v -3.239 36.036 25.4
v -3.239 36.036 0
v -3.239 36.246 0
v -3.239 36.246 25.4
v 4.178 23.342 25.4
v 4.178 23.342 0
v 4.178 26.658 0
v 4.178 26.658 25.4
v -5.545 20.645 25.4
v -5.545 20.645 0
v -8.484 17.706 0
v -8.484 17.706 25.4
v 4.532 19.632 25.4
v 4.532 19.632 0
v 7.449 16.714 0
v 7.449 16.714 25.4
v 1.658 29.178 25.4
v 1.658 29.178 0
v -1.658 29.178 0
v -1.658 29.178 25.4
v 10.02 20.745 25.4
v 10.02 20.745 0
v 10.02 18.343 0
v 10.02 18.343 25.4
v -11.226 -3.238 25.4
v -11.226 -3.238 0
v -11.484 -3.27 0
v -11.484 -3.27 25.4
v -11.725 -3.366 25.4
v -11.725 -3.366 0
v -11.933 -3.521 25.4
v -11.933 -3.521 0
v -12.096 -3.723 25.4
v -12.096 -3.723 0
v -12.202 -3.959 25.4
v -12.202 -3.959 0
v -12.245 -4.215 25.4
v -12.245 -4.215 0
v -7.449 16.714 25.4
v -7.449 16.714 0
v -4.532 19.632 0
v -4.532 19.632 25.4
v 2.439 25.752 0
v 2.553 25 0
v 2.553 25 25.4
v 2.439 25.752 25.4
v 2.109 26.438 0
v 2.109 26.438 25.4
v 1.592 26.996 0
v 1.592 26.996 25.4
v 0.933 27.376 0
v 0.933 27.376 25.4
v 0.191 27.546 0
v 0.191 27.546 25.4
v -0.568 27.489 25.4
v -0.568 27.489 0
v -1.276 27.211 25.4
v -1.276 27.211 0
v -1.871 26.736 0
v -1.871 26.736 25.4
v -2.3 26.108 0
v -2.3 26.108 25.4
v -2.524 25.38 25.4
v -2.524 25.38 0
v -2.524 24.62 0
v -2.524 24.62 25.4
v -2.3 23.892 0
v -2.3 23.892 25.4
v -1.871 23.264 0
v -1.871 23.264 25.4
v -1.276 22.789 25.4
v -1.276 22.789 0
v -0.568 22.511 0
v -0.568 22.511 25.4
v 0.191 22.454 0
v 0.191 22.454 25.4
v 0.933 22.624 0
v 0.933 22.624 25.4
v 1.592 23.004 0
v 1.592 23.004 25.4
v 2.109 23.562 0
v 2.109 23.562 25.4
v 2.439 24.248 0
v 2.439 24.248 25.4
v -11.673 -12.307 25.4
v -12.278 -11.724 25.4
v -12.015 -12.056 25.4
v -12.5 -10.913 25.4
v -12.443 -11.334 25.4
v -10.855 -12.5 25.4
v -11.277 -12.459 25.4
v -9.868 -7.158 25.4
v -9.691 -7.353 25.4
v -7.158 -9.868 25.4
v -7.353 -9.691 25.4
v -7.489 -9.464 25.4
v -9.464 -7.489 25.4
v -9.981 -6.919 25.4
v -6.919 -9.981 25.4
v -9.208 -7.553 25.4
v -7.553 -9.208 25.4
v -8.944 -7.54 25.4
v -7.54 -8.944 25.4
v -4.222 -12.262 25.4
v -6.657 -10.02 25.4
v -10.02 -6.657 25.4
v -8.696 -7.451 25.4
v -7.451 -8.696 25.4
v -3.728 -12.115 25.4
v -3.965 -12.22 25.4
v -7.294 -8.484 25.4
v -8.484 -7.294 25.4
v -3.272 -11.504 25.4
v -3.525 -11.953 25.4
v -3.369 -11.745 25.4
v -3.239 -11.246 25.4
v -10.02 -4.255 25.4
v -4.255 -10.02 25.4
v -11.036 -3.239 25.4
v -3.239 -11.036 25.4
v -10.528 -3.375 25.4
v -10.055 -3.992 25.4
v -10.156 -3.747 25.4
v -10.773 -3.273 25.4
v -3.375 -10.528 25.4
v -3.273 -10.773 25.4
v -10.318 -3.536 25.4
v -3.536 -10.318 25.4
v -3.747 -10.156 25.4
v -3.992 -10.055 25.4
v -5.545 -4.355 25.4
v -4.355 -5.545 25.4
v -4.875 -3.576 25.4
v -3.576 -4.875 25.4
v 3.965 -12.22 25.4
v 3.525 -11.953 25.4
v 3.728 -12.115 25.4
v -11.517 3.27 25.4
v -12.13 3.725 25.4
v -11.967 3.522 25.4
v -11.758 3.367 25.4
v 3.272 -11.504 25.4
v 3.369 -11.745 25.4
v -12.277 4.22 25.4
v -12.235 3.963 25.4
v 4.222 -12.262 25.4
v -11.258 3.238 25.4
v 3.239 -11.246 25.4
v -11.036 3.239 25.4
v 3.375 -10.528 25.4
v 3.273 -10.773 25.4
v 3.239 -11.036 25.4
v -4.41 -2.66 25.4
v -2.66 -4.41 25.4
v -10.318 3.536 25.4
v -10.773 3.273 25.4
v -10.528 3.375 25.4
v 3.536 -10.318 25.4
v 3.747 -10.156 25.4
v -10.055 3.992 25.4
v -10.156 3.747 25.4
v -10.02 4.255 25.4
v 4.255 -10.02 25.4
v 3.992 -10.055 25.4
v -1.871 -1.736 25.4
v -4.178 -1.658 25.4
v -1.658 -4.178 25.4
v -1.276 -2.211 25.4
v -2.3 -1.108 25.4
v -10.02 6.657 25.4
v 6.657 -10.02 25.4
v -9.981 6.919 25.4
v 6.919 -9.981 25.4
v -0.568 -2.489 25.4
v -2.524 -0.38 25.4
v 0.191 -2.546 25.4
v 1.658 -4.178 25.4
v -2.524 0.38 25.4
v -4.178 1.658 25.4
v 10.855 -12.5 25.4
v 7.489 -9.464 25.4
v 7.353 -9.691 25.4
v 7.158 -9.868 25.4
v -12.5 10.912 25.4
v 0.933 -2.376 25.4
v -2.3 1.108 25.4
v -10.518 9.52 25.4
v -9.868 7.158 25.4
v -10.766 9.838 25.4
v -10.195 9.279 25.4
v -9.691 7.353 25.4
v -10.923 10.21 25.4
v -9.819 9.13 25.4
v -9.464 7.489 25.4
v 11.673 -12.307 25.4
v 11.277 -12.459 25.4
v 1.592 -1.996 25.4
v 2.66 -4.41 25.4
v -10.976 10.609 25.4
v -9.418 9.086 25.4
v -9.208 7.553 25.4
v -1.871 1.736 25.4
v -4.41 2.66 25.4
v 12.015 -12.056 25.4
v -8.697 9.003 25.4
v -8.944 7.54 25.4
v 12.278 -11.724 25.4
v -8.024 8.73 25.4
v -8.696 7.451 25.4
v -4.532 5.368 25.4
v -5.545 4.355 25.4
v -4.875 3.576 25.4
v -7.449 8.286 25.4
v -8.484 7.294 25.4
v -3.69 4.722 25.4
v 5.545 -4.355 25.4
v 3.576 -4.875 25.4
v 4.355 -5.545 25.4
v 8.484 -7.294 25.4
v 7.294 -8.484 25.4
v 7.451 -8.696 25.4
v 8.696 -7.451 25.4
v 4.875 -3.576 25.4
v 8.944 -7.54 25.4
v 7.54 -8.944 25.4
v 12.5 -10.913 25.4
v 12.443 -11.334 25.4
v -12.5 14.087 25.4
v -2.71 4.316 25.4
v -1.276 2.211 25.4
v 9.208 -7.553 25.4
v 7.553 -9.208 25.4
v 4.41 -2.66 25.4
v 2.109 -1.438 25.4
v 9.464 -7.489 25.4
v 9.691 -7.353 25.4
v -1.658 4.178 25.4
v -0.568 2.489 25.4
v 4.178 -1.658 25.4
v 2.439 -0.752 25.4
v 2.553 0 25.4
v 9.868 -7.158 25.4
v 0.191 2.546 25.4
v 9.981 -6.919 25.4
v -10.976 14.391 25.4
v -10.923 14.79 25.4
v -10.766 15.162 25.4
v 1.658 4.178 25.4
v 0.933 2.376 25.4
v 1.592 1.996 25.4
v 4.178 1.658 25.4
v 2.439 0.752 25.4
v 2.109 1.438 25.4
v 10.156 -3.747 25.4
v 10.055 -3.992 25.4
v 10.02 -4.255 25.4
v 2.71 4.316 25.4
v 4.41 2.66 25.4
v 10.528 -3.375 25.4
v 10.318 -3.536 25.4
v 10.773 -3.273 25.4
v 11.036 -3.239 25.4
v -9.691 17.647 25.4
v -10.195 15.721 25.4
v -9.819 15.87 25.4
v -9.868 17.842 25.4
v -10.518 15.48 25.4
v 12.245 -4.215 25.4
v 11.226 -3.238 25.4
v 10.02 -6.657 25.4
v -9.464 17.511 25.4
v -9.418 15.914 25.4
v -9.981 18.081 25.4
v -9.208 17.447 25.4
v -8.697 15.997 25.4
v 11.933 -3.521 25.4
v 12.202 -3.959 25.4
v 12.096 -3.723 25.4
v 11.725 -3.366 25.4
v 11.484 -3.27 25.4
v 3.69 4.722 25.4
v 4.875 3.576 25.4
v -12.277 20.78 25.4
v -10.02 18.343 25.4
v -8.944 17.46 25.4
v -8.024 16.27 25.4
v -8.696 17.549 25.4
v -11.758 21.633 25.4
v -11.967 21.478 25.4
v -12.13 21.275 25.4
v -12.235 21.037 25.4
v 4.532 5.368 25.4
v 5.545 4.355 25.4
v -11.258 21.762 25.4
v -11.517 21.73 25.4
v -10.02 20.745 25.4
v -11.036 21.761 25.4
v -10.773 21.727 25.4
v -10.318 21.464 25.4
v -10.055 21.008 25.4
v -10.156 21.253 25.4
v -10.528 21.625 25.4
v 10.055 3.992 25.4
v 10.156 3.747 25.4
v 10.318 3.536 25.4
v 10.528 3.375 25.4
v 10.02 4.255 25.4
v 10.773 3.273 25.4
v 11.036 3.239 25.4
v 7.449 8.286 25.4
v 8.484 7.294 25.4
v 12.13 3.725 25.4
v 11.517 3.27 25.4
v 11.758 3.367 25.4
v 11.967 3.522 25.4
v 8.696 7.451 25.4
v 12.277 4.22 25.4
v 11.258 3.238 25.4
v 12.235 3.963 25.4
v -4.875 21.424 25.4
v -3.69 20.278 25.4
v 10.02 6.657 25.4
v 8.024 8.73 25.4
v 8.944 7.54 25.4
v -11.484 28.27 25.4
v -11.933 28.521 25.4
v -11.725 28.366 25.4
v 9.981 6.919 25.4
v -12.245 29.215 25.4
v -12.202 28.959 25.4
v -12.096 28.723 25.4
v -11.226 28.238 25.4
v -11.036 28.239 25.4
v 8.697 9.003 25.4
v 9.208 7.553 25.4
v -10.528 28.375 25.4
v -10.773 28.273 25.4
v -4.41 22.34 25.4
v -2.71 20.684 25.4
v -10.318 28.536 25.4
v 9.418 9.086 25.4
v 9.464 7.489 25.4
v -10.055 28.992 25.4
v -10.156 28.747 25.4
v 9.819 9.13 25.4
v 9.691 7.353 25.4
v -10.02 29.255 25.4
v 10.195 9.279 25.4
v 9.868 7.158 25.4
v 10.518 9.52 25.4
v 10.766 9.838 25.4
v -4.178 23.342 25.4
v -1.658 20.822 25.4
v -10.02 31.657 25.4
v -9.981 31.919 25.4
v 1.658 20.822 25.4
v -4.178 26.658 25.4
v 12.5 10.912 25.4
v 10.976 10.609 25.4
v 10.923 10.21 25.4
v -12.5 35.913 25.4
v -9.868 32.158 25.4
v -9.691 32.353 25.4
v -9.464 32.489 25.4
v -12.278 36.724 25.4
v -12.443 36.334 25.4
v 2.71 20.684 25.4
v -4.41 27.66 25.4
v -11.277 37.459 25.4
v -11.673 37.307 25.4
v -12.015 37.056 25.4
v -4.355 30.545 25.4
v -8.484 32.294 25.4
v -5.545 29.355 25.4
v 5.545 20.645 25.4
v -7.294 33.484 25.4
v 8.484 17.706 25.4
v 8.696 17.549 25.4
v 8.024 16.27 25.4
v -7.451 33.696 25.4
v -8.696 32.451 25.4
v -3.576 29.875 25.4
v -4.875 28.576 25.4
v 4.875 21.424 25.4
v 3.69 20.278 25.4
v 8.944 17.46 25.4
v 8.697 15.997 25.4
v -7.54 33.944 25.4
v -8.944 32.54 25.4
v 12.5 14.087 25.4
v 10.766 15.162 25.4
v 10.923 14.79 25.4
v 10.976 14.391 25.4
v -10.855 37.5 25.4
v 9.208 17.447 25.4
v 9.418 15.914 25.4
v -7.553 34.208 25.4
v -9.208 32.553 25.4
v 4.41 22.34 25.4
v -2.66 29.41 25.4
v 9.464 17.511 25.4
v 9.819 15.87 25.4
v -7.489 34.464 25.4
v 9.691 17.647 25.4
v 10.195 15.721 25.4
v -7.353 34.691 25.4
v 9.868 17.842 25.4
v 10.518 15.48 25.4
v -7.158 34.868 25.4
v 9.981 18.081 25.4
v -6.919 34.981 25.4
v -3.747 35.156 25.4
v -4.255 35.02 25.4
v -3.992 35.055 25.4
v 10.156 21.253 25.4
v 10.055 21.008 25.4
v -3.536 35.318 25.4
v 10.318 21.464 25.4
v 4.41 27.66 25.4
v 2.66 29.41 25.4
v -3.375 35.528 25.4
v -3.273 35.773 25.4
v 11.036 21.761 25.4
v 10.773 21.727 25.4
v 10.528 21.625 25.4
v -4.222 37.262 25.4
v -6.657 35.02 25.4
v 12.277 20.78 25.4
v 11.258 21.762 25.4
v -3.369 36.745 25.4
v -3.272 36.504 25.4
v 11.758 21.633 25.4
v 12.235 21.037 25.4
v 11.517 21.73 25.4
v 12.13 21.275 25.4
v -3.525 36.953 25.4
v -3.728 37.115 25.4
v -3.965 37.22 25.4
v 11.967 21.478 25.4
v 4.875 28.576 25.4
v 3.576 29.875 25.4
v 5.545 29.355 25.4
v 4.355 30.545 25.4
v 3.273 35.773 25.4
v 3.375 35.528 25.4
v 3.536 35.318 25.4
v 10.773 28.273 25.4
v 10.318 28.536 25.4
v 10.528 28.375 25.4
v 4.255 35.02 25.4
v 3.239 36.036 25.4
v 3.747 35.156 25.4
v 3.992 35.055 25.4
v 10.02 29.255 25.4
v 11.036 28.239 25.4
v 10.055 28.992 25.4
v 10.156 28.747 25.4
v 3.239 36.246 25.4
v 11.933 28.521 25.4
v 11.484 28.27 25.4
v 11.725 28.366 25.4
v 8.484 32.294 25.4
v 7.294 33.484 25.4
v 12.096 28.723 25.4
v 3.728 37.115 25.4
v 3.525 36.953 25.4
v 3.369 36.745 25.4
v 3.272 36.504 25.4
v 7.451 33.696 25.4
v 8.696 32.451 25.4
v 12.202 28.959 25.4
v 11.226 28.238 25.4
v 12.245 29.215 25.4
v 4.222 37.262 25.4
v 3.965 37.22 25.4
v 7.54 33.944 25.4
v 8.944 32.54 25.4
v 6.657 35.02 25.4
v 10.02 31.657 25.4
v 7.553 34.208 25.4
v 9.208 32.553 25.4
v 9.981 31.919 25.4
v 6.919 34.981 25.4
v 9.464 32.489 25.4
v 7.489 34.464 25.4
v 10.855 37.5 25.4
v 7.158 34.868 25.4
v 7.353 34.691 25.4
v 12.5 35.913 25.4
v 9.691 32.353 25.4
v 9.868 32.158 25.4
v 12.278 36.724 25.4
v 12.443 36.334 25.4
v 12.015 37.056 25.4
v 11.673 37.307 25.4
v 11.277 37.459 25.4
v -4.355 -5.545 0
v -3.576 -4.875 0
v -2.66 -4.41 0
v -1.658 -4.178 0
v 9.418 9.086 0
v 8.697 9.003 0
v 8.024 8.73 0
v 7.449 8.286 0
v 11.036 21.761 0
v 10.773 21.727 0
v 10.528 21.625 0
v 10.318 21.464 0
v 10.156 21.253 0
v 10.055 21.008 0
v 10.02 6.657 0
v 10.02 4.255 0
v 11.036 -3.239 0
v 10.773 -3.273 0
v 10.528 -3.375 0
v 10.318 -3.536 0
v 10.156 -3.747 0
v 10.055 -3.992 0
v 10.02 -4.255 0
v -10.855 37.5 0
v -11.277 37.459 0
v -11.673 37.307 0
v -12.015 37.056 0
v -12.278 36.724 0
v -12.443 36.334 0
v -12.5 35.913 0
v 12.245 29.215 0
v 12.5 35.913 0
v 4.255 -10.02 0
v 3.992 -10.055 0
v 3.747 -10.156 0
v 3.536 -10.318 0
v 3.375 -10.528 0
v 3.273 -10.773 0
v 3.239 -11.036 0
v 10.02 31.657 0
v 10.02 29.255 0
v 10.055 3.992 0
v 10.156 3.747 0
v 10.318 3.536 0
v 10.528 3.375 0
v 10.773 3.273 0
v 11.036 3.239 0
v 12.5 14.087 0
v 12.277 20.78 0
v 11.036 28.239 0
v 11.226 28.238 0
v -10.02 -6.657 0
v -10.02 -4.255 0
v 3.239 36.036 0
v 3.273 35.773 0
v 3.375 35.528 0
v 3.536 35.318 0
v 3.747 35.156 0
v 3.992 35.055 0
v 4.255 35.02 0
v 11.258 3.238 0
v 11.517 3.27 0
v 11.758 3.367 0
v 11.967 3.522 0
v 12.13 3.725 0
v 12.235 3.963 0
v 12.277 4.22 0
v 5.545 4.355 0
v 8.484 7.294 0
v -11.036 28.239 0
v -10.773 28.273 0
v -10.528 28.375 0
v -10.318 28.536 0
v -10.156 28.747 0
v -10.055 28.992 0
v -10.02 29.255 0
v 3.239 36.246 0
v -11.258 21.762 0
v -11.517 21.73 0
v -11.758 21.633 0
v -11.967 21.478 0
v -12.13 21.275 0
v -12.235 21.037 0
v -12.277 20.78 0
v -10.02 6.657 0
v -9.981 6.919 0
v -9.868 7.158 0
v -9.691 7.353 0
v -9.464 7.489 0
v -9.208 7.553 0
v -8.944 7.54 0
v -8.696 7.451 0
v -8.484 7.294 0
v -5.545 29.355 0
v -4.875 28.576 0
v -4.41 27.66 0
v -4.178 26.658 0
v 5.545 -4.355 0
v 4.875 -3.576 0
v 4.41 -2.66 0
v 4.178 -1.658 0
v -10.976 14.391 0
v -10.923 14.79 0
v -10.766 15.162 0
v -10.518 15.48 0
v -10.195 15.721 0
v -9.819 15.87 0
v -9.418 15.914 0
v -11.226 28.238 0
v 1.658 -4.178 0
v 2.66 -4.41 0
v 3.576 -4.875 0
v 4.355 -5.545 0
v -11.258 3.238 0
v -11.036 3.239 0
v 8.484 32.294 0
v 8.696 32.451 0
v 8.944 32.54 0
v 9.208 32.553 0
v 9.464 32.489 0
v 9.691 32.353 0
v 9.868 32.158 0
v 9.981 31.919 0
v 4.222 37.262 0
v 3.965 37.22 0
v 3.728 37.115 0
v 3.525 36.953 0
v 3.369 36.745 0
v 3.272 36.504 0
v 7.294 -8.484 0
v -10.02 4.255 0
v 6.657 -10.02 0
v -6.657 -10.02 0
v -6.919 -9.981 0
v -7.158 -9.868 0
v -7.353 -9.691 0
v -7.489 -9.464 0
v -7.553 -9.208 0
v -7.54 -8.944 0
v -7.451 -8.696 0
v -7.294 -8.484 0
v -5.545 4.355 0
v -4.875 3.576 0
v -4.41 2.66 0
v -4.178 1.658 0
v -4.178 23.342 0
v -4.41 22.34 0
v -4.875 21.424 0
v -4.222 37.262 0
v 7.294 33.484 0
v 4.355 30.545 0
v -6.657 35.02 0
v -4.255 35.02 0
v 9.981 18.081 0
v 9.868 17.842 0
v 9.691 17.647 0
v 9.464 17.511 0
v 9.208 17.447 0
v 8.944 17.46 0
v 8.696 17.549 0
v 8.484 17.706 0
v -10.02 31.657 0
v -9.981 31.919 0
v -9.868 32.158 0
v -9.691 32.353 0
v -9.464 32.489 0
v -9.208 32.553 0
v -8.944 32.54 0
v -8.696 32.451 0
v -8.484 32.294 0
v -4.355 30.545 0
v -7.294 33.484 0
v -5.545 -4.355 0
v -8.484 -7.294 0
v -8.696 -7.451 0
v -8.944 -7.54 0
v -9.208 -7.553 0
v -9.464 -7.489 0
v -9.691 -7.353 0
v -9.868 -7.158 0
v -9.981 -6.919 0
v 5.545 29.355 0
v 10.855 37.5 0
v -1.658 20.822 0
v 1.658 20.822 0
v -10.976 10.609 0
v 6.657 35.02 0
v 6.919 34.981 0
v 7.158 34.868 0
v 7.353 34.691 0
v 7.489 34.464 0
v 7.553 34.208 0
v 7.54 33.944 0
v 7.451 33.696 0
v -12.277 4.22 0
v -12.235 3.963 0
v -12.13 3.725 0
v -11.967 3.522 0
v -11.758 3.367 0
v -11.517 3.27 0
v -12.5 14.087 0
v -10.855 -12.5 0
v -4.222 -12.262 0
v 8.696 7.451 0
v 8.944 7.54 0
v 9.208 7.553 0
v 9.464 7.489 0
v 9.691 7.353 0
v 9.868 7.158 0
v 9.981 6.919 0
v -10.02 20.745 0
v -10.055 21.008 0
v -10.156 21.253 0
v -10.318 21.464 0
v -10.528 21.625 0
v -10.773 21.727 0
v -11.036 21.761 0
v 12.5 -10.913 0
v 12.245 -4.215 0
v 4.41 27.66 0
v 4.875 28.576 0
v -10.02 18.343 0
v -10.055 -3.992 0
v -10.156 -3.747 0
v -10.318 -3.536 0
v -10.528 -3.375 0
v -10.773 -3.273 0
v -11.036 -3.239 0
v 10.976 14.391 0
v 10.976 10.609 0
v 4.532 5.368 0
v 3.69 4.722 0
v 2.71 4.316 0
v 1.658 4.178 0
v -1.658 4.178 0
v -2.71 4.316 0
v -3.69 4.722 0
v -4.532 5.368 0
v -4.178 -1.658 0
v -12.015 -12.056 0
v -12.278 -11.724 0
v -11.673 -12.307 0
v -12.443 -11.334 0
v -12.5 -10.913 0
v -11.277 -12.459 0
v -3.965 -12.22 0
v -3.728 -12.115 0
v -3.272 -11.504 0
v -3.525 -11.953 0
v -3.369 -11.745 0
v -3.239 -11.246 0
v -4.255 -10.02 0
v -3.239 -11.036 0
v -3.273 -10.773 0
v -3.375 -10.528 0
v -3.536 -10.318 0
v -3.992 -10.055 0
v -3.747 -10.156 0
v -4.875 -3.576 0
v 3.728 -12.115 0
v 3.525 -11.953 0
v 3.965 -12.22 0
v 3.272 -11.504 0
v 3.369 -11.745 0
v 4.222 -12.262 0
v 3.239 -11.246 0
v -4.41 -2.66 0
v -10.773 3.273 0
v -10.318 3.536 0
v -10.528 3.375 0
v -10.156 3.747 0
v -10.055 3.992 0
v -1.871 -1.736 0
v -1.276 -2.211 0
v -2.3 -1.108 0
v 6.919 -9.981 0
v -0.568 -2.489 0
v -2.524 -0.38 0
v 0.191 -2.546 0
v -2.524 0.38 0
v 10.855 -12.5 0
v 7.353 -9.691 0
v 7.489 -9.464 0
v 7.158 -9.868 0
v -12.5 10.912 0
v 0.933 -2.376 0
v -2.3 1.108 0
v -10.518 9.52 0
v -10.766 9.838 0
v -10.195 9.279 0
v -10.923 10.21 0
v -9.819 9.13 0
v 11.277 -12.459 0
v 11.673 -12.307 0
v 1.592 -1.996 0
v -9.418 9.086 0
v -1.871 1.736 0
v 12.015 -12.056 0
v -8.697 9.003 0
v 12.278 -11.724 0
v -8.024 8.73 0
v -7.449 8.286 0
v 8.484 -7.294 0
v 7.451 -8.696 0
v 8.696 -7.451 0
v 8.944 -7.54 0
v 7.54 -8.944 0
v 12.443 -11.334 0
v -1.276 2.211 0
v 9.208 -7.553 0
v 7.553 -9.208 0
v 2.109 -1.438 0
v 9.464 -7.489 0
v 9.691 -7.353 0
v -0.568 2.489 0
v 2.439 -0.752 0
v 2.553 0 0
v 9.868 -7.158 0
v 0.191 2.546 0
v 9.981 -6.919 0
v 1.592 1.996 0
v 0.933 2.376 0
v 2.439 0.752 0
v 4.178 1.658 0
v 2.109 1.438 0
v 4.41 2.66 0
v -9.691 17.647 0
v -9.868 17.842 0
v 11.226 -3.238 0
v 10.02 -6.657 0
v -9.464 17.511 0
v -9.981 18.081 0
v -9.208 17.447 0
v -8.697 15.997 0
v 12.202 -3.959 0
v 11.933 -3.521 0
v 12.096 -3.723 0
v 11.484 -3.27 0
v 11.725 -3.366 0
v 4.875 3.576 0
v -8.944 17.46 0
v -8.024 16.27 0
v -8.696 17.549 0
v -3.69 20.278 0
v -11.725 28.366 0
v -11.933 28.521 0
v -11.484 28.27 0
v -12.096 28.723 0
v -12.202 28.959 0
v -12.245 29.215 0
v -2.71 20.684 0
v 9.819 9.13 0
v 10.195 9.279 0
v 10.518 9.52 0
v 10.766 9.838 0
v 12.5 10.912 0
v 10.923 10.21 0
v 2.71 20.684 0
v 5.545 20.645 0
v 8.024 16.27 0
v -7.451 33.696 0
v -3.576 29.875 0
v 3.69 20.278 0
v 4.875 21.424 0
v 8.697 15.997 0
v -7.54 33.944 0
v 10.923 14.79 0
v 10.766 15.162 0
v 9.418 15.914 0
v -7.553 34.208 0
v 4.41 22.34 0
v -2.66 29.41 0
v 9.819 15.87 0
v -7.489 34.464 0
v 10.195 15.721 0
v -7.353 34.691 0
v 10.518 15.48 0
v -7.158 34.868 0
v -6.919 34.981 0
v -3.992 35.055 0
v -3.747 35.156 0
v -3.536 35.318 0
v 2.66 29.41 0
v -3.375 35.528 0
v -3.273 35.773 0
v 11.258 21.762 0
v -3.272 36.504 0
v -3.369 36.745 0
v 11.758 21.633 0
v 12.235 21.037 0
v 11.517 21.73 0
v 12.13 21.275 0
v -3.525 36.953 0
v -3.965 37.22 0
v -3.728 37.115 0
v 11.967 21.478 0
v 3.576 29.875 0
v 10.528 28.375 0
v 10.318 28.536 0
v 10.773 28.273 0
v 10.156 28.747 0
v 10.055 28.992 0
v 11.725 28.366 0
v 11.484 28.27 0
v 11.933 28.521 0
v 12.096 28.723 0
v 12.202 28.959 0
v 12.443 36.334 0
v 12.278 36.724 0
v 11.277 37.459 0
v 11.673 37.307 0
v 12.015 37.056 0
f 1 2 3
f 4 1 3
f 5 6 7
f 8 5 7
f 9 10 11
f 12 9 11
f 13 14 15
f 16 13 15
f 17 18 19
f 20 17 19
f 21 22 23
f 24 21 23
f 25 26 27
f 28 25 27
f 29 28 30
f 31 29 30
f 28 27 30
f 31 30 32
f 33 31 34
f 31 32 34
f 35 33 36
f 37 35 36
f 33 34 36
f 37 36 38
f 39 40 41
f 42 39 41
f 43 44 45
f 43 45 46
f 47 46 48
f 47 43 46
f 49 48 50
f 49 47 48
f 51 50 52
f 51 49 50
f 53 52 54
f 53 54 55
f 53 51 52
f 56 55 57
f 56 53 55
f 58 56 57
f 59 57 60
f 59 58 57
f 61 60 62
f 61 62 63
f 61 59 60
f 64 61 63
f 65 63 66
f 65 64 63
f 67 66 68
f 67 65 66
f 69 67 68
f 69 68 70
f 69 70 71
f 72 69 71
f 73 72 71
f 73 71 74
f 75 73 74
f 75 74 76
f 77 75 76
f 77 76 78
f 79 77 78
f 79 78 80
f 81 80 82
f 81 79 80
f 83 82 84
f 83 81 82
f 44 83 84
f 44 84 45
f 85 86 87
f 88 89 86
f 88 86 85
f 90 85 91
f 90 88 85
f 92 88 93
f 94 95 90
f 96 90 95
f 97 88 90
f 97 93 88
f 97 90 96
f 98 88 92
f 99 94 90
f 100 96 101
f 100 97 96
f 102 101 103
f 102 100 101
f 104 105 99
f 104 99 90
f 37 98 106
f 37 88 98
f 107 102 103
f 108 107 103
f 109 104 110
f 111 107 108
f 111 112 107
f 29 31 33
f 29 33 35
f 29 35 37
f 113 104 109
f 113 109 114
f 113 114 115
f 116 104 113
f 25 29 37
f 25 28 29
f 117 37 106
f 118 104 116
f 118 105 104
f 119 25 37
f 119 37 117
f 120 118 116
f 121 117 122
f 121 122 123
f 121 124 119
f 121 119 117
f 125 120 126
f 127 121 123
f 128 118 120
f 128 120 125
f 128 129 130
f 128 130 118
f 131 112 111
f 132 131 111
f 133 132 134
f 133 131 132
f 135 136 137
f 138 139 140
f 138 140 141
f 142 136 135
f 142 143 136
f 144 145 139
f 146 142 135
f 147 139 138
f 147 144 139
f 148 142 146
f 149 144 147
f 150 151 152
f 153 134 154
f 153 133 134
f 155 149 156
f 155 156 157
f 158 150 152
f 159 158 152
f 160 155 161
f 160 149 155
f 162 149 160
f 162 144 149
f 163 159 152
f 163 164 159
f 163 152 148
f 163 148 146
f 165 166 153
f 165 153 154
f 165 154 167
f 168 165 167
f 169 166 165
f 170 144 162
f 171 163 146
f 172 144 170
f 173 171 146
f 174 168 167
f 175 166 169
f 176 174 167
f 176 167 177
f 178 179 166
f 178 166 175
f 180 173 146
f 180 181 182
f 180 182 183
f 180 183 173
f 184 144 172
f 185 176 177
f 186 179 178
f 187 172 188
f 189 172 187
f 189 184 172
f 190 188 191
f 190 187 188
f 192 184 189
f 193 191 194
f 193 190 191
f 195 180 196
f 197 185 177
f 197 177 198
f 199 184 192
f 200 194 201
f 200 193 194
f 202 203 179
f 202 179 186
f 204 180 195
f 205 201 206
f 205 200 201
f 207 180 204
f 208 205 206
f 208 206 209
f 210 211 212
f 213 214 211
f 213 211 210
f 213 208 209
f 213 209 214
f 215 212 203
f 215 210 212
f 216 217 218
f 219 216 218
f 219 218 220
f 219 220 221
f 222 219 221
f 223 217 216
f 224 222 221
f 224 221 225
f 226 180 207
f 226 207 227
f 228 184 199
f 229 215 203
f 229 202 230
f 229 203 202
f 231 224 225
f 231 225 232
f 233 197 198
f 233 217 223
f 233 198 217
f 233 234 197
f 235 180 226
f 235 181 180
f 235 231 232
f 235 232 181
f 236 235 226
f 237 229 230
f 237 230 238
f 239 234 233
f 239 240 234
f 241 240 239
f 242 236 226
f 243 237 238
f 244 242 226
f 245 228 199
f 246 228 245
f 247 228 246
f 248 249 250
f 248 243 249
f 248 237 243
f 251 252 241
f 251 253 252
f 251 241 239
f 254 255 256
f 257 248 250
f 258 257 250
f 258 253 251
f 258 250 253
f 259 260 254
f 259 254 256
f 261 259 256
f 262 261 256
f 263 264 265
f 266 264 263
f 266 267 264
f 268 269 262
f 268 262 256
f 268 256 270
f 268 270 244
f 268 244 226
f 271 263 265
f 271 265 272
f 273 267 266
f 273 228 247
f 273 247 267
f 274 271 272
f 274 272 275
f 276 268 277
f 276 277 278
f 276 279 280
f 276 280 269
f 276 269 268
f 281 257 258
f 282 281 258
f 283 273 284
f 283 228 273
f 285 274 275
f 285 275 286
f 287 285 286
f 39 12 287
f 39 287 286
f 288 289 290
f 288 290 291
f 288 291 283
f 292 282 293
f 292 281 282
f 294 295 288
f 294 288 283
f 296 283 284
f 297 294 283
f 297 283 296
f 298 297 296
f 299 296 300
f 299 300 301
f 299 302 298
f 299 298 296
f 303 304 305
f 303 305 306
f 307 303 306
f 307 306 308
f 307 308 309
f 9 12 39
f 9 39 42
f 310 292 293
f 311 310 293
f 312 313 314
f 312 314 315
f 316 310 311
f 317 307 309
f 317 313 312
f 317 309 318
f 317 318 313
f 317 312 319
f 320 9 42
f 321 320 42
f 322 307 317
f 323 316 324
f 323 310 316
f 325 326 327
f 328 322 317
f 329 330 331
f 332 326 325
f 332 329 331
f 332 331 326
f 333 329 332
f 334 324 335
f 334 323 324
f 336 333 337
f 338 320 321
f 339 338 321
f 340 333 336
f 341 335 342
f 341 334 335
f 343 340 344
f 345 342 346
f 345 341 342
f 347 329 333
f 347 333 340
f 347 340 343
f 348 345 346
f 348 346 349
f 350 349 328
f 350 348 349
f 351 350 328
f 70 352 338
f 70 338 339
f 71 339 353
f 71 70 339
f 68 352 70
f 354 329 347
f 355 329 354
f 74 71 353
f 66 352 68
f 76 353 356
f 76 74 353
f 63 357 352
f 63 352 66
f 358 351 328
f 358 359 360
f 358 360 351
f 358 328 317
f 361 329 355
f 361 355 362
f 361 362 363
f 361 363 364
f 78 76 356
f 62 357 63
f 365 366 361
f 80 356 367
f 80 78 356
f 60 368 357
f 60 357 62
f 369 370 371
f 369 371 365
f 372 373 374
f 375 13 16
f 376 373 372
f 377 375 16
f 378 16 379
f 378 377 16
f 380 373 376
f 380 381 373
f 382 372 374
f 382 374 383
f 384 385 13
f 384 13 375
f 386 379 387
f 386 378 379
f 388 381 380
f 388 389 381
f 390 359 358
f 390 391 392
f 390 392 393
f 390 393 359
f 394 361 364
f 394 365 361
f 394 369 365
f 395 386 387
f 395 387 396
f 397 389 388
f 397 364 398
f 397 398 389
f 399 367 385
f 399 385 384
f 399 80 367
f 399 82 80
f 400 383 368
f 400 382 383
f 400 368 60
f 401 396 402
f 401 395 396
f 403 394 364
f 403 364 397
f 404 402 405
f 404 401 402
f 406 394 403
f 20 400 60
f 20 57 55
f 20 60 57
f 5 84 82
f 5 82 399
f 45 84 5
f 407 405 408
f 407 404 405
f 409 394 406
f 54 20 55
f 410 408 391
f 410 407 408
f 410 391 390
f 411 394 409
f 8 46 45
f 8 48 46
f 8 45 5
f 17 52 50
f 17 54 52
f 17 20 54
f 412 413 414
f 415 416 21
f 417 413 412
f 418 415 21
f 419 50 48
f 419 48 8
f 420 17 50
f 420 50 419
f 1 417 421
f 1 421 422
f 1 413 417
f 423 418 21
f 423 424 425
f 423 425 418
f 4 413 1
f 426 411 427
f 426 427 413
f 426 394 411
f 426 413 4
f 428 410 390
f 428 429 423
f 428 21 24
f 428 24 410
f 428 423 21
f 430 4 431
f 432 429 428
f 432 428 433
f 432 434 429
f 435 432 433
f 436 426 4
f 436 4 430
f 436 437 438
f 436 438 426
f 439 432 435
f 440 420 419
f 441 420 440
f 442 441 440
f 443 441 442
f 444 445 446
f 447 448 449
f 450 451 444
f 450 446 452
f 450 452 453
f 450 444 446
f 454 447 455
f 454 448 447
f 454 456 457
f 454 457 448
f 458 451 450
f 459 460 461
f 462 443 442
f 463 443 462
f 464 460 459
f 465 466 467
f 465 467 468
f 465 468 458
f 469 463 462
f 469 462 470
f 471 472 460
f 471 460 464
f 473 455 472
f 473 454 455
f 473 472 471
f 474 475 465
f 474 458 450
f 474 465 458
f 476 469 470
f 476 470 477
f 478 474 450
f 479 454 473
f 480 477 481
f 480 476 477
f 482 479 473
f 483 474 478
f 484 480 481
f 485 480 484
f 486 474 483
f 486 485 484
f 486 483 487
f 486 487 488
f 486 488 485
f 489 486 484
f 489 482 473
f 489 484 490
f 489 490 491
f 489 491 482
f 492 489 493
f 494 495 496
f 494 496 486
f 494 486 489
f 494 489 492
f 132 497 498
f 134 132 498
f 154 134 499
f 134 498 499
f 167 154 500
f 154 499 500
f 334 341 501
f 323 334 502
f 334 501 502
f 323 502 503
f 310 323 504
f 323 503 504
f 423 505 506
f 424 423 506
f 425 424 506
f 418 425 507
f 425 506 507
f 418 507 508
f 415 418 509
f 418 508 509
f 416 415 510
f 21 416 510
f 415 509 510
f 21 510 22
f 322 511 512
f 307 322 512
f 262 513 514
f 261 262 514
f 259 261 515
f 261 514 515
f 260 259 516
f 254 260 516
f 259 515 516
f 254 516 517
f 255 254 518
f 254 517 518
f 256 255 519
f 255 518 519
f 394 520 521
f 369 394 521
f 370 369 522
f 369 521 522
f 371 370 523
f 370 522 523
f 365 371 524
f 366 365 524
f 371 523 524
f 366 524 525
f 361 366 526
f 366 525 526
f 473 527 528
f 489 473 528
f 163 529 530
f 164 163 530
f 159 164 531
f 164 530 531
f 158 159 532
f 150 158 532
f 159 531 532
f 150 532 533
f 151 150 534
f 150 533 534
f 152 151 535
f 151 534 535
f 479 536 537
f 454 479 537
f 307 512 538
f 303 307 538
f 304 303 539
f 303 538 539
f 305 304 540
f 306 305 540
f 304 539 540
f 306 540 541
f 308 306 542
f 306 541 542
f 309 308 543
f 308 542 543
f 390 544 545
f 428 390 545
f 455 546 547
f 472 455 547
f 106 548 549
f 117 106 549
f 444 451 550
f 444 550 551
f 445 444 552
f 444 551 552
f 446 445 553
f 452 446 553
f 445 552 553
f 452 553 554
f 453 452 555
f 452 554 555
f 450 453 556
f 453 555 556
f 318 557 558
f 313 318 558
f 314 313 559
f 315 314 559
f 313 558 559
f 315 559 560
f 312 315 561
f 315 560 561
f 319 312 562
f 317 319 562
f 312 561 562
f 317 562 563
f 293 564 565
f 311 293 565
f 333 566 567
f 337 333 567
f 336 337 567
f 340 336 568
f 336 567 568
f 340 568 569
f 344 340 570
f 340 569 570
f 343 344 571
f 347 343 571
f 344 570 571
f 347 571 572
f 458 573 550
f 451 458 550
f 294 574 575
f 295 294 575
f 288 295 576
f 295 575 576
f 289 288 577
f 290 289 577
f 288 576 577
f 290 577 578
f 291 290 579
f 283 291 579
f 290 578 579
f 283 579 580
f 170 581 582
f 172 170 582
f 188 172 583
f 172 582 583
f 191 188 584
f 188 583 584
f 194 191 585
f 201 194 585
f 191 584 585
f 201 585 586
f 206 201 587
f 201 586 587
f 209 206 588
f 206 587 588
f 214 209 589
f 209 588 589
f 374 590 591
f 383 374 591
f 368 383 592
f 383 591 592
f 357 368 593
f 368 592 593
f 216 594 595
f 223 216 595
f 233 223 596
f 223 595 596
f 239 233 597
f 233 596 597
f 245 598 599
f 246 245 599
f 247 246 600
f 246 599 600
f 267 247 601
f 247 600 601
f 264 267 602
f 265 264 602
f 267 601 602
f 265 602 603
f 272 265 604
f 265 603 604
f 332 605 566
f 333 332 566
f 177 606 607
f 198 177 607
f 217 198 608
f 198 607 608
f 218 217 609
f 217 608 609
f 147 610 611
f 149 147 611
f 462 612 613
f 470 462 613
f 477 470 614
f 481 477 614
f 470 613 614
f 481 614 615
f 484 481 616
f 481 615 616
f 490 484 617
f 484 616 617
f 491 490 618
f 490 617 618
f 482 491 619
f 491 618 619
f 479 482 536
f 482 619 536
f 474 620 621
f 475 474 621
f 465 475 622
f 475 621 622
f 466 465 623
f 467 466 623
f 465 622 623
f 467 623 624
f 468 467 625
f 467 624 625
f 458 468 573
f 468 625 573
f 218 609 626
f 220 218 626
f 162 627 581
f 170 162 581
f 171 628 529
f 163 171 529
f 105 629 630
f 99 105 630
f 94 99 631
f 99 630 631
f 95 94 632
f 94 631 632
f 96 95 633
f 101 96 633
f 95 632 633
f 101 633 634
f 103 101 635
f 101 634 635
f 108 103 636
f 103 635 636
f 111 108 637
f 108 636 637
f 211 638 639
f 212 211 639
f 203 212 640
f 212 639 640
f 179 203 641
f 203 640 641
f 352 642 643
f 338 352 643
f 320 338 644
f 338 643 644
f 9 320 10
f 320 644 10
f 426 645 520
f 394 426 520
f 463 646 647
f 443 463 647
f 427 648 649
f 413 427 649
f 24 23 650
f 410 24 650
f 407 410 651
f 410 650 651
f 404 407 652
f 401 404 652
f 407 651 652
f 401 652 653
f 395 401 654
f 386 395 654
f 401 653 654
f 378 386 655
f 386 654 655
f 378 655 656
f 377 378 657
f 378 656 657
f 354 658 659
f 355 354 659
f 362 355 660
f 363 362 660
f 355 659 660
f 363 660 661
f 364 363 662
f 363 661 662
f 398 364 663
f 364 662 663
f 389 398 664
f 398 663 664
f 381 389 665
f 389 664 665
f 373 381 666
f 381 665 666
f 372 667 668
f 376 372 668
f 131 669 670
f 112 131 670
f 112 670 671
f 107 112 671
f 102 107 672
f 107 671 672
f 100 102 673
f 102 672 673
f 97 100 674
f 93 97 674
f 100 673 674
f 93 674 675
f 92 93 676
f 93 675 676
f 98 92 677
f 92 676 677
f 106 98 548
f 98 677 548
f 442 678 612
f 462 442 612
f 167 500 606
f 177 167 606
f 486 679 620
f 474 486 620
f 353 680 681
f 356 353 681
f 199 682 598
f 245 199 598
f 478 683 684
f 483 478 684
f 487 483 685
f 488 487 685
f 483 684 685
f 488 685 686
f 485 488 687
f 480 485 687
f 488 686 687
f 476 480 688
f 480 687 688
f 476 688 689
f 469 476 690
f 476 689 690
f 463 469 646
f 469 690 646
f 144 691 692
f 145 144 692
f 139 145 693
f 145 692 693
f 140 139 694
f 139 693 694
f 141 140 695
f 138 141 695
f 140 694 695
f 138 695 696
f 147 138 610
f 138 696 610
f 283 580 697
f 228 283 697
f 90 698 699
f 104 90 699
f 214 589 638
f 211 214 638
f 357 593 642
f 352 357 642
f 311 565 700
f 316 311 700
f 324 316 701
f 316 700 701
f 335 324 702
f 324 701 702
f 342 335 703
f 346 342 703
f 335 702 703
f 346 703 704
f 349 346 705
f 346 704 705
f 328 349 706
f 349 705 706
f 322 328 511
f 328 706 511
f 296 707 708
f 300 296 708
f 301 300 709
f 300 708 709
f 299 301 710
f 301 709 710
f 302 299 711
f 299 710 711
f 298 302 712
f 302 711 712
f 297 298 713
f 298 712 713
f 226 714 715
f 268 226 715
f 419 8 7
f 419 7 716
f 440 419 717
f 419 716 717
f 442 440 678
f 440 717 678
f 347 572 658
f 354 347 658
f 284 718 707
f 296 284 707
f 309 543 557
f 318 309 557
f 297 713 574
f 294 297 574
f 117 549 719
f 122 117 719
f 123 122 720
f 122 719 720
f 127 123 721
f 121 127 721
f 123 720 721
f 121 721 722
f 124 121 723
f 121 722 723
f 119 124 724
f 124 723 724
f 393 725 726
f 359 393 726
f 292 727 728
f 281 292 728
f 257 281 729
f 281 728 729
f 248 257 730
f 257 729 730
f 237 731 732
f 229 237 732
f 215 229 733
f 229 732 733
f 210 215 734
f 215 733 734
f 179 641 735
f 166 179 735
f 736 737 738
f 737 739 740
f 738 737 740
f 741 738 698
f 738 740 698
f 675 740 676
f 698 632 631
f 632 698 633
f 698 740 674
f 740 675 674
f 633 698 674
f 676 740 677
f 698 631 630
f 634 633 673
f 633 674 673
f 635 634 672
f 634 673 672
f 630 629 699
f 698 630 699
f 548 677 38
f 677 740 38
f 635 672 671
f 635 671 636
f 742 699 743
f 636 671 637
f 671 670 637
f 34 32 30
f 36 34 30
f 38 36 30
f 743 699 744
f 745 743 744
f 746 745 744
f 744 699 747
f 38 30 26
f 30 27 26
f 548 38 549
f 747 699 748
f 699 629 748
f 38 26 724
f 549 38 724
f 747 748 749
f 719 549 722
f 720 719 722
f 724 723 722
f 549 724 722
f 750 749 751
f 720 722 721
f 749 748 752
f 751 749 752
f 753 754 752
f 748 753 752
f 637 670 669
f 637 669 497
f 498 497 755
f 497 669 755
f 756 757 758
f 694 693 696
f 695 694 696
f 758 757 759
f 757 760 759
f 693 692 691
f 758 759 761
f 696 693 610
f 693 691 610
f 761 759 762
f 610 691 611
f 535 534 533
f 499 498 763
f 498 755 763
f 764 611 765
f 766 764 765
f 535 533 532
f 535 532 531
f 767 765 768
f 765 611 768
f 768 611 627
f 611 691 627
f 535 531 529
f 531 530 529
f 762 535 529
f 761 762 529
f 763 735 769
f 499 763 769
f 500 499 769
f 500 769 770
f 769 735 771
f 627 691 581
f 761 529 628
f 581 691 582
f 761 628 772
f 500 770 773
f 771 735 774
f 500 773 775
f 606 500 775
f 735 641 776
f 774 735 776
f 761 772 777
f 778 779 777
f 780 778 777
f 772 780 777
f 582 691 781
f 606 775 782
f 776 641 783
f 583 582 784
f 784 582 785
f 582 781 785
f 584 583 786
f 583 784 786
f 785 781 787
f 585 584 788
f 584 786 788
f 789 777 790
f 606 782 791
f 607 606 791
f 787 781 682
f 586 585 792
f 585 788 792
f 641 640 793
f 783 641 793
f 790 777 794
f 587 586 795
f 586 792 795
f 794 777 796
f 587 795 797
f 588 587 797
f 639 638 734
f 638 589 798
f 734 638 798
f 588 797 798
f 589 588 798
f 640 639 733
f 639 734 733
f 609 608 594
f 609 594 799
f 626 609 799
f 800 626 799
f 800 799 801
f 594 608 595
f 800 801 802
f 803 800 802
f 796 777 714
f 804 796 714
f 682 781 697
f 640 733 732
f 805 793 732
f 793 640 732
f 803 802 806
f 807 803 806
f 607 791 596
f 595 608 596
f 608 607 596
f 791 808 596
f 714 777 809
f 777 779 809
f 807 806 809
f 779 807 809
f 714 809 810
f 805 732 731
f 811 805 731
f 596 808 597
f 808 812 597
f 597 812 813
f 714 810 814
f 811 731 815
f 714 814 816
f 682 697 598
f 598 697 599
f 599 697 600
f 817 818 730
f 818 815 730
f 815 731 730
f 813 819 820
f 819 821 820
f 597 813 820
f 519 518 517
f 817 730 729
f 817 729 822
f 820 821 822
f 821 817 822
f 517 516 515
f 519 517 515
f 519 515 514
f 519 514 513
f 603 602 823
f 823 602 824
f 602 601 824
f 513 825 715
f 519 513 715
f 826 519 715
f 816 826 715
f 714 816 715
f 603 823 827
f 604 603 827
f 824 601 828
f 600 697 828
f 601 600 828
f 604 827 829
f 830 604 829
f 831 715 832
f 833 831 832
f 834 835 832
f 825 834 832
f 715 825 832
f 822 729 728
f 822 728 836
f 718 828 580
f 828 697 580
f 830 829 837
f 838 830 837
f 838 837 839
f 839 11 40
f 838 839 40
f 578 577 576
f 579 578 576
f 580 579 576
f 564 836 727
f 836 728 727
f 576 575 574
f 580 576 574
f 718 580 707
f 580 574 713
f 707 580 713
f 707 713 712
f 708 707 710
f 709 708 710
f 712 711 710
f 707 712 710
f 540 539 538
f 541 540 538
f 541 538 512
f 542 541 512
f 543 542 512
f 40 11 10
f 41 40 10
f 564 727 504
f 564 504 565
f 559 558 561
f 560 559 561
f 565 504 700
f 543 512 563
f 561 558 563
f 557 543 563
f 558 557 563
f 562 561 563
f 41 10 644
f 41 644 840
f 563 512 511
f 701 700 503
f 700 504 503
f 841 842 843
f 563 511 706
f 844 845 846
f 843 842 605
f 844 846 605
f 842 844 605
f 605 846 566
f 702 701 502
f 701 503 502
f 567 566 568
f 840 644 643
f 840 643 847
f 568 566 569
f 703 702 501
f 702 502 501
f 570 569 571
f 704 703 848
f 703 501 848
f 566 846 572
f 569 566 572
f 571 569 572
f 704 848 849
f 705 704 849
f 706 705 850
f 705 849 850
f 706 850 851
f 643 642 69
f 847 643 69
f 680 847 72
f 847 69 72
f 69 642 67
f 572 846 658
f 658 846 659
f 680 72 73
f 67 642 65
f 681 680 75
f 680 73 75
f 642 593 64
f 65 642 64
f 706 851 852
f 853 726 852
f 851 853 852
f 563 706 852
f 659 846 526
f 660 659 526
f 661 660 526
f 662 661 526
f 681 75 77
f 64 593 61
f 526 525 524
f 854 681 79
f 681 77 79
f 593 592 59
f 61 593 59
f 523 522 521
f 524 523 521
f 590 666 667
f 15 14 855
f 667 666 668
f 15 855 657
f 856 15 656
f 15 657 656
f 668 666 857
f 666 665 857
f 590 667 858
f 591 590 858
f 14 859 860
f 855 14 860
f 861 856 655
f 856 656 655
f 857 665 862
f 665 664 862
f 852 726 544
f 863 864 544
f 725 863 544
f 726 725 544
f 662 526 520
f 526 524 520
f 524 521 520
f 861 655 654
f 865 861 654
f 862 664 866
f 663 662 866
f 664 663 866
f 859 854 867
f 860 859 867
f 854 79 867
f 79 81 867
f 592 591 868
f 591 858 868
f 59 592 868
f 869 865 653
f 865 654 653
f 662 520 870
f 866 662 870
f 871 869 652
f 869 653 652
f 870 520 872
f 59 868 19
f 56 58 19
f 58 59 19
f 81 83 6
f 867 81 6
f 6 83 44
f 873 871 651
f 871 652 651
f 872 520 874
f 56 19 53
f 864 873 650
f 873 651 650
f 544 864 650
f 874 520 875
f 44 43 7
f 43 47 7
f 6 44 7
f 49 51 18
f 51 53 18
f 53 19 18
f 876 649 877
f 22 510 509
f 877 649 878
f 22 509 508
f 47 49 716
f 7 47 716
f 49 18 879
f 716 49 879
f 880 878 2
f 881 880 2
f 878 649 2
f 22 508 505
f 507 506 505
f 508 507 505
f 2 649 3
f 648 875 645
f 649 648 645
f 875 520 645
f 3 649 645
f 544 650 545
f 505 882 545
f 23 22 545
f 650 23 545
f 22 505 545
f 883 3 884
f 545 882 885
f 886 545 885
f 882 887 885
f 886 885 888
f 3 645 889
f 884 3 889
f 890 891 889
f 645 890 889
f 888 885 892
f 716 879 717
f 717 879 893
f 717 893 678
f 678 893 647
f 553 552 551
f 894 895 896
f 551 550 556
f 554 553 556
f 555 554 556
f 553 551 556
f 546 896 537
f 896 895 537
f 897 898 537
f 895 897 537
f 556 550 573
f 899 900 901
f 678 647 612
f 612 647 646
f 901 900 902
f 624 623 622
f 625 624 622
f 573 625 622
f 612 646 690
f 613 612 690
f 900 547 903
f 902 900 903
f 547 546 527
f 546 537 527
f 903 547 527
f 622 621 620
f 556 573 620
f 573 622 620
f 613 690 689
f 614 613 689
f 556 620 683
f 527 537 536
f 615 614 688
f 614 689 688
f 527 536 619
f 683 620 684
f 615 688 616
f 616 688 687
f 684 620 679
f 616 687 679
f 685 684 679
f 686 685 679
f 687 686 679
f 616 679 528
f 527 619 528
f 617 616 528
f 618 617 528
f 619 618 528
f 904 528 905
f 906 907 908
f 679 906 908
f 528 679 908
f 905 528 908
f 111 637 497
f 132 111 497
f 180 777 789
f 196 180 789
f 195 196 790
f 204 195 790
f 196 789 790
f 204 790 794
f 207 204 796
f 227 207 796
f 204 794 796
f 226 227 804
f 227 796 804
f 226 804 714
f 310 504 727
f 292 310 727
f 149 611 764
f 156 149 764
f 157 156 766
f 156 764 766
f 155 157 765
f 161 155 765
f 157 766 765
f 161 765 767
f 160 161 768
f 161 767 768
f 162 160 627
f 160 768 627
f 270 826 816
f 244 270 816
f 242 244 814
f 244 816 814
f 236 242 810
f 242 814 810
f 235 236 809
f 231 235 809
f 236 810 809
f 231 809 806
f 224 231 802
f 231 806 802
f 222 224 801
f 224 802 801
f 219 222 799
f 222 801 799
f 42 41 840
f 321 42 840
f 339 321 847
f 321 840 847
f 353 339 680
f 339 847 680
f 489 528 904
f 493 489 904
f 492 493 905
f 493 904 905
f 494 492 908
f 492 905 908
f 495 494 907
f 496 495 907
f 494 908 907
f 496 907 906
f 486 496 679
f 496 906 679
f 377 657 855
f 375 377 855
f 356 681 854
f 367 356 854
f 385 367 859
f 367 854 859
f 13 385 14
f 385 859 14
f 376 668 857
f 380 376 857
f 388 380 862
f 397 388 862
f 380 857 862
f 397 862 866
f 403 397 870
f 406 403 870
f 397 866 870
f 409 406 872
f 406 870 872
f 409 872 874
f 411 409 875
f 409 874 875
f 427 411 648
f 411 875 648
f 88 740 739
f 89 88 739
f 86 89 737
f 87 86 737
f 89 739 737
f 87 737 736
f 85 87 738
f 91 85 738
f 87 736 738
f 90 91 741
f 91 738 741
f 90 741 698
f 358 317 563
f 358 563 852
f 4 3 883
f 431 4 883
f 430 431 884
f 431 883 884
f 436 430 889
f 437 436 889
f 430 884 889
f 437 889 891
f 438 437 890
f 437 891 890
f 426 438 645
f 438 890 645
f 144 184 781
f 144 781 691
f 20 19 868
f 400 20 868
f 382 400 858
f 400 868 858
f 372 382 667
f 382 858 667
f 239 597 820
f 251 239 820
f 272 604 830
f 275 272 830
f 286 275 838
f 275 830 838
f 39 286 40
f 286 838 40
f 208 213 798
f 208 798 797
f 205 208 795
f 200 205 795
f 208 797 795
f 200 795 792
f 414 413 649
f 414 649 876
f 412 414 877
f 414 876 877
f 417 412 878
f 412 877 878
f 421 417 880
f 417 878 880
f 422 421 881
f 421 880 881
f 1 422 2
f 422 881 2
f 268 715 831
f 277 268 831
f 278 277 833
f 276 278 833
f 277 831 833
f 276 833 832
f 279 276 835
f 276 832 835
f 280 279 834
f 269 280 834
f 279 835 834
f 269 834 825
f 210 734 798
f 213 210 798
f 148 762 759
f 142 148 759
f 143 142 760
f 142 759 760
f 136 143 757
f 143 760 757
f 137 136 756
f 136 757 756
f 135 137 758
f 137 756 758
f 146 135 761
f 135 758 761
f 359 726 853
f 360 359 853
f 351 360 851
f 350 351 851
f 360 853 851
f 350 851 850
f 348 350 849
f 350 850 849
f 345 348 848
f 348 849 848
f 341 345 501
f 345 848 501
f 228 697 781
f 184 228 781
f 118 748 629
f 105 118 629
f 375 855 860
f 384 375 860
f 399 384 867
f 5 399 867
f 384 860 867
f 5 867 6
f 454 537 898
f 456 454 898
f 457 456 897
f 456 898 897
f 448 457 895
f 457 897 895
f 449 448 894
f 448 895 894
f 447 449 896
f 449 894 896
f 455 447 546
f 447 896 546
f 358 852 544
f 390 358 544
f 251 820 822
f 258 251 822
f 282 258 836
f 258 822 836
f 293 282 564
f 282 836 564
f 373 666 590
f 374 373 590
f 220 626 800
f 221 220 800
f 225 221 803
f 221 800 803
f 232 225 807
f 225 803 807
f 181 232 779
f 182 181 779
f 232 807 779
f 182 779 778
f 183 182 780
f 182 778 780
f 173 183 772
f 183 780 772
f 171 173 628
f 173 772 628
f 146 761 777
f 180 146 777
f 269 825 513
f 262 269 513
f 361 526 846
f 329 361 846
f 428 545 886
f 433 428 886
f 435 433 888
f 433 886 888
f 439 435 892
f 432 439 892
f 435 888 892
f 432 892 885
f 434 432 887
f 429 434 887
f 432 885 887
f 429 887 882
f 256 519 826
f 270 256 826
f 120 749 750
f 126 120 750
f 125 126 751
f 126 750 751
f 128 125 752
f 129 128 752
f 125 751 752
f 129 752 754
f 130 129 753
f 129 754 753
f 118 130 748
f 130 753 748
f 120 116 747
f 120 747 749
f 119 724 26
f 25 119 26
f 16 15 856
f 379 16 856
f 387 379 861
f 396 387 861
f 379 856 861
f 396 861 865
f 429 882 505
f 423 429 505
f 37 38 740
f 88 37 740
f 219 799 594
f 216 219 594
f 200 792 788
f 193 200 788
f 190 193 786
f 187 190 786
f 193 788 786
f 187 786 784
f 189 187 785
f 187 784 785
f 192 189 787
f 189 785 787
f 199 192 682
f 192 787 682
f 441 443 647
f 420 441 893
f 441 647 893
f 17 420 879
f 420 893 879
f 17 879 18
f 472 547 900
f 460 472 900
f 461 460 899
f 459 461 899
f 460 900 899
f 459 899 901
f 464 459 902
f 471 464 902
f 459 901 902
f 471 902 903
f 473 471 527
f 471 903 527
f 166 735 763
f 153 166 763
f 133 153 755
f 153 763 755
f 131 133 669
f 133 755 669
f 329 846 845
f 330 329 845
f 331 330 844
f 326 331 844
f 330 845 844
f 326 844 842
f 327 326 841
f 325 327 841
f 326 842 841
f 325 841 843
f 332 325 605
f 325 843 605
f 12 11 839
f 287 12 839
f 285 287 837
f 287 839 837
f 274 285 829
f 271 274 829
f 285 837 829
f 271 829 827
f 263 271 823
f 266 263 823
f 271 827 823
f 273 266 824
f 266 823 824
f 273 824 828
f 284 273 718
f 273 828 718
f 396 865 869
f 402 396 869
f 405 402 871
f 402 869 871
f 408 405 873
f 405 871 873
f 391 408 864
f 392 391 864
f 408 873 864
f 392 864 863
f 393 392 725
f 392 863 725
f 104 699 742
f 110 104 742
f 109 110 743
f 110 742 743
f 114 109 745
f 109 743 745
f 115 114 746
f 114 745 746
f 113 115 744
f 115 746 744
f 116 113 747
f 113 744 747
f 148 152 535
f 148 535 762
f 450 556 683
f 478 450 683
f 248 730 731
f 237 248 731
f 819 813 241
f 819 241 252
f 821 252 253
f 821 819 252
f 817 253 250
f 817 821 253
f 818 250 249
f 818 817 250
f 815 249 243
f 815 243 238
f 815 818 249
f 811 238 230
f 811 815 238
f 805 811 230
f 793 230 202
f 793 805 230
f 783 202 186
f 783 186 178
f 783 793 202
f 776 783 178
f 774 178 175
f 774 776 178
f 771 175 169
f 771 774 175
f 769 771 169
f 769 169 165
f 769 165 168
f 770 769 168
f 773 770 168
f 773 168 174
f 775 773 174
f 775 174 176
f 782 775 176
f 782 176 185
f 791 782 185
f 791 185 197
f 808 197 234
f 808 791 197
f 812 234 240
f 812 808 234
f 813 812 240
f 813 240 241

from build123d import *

# Parameters (mm, degrees)
SKETCH1_R      = 2.552699952
EXTRUDE1_DEPTH = 25.4


with BuildPart() as part:
    # Sketch1 → Extrude1 (new body)
    with BuildSketch(Plane.XY):
        with BuildLine():
            Line((-8.483605576, 7.293893252), (-5.545081932, 4.355385482))
            ThreePointArc((-5.545081932, 4.355385482), (-4.614735711, 3.132038282), (-4.177987221, 1.658480269))
            Line((-4.177987221, 1.658480269), (-4.177987221, -1.658480269))
            ThreePointArc((-4.177987221, -1.658480269), (-4.614735711, -3.132038282), (-5.545081932, -4.355385482))
            Line((-5.545081932, -4.355385482), (-8.483605576, -7.293893252))
            ThreePointArc((-8.483605576, -7.293893252), (-9.464416196, -7.488986523), (-10.019999931, -6.657495349))
            Line((-10.019999931, -6.657495349), (-10.019999685, -4.25451262))
            ThreePointArc((-10.019999685, -4.25451262), (-10.317579227, -3.536092054), (-11.035999792, -3.238512512))
            Line((-11.035999792, -3.238512512), (-11.226349864, -3.237859075))
            ThreePointArc((-11.226349864, -3.237859075), (-11.933208752, -3.520692129), (-12.24510272, -4.215217994))
            Line((-12.24510272, -4.215217994), (-12.499999765, -10.913485754))
            ThreePointArc((-12.499999765, -10.913485754), (-12.014686132, -12.056001152), (-10.855475092, -12.4999612))
            Line((-10.855475092, -12.4999612), (-4.22175692, -12.26151704))
            ThreePointArc((-4.22175692, -12.26151704), (-3.524602107, -11.952788933), (-3.238512512, -11.246042429))
            Line((-3.238512512, -11.246042429), (-3.238512512, -11.035999792))
            ThreePointArc((-3.238512512, -11.035999792), (-3.536092054, -10.317579227), (-4.25451262, -10.019999685))
            Line((-4.25451262, -10.019999685), (-6.657495349, -10.019999931))
            ThreePointArc((-6.657495349, -10.019999931), (-7.488986523, -9.464416196), (-7.293893252, -8.483605576))
            Line((-7.293893252, -8.483605576), (-4.355385482, -5.545081932))
            ThreePointArc((-4.355385482, -5.545081932), (-3.132038282, -4.614735711), (-1.658480269, -4.177987221))
            Line((-1.658480269, -4.177987221), (1.658480269, -4.177987221))
            ThreePointArc((1.658480269, -4.177987221), (3.132038282, -4.614735711), (4.355385482, -5.545081932))
            Line((4.355385482, -5.545081932), (7.293893252, -8.483605576))
            ThreePointArc((7.293893252, -8.483605576), (7.488986523, -9.464416196), (6.657495349, -10.019999931))
            Line((6.657495349, -10.019999931), (4.25451262, -10.019999685))
            ThreePointArc((4.25451262, -10.019999685), (3.536092054, -10.317579227), (3.238512512, -11.035999792))
            Line((3.238512512, -11.035999792), (3.238512512, -11.246042429))
            ThreePointArc((3.238512512, -11.246042429), (3.524602107, -11.952788933), (4.22175692, -12.26151704))
            Line((4.22175692, -12.26151704), (10.855475092, -12.4999612))
            ThreePointArc((10.855475092, -12.4999612), (12.014686132, -12.056001152), (12.499999765, -10.913485754))
            Line((12.499999765, -10.913485754), (12.24510272, -4.215217994))
            ThreePointArc((12.24510272, -4.215217994), (11.933208752, -3.520692129), (11.226349864, -3.237859075))
            Line((11.226349864, -3.237859075), (11.035999792, -3.238512512))
            ThreePointArc((11.035999792, -3.238512512), (10.317579227, -3.536092054), (10.019999685, -4.25451262))
            Line((10.019999685, -4.25451262), (10.019999931, -6.657495349))
            ThreePointArc((10.019999931, -6.657495349), (9.464416196, -7.488986523), (8.483605576, -7.293893252))
            Line((8.483605576, -7.293893252), (5.545081932, -4.355385482))
            ThreePointArc((5.545081932, -4.355385482), (4.614735711, -3.132038282), (4.177987221, -1.658480269))
            Line((4.177987221, -1.658480269), (4.177987221, 1.658480269))
            ThreePointArc((4.177987221, 1.658480269), (4.614735711, 3.132038282), (5.545081932, 4.355385482))
            Line((5.545081932, 4.355385482), (8.483605576, 7.293893252))
            ThreePointArc((8.483605576, 7.293893252), (9.464416196, 7.488986523), (10.019999931, 6.657495349))
            Line((10.019999931, 6.657495349), (10.019999685, 4.25451262))
            ThreePointArc((10.019999685, 4.25451262), (10.317579227, 3.536092054), (11.035999792, 3.238512512))
            Line((11.035999792, 3.238512512), (11.258353132, 3.237749214))
            ThreePointArc((11.258353132, 3.237749214), (11.966958292, 3.522261588), (12.277278698, 4.219950495))
            Line((12.277278698, 4.219950495), (12.499999765, 10.912499795))
            Line((12.499999765, 10.912499795), (12.499999765, 14.087499735))
            Line((12.499999765, 14.087499735), (12.277278698, 20.780049035))
            ThreePointArc((12.277278698, 20.780049035), (11.966958292, 21.477737942), (11.258353132, 21.762250316))
            Line((11.258353132, 21.762250316), (11.035999792, 21.761487018))
            ThreePointArc((11.035999792, 21.761487018), (10.317579227, 21.463907476), (10.019999685, 20.74548691))
            Line((10.019999685, 20.74548691), (10.019999931, 18.34250418))
            ThreePointArc((10.019999931, 18.34250418), (9.464416196, 17.511013007), (8.483605576, 17.706106278))
            Line((8.483605576, 17.706106278), (5.545081932, 20.644614048))
            ThreePointArc((5.545081932, 20.644614048), (4.614735711, 21.867961248), (4.177987221, 23.341519261))
            Line((4.177987221, 23.341519261), (4.177987221, 26.658479799))
            ThreePointArc((4.177987221, 26.658479799), (4.614735711, 28.132037812), (5.545081932, 29.355385011))
            Line((5.545081932, 29.355385011), (8.483605576, 32.293892782))
            ThreePointArc((8.483605576, 32.293892782), (9.464416196, 32.488986052), (10.019999931, 31.657494879))
            Line((10.019999931, 31.657494879), (10.019999685, 29.25451215))
            ThreePointArc((10.019999685, 29.25451215), (10.317579227, 28.536091584), (11.035999792, 28.238512042))
            Line((11.035999792, 28.238512042), (11.226349864, 28.237858605))
            ThreePointArc((11.226349864, 28.237858605), (11.933208752, 28.520691659), (12.24510272, 29.215217524))
            Line((12.24510272, 29.215217524), (12.499999765, 35.913485284))
            ThreePointArc((12.499999765, 35.913485284), (12.014686132, 37.056000682), (10.855475092, 37.499960729))
            Line((10.855475092, 37.499960729), (4.22175692, 37.261516569))
            ThreePointArc((4.22175692, 37.261516569), (3.524602107, 36.952788463), (3.238512512, 36.246041959))
            Line((3.238512512, 36.246041959), (3.238512512, 36.035999322))
            ThreePointArc((3.238512512, 36.035999322), (3.536092054, 35.317578756), (4.25451262, 35.019999214))
            Line((4.25451262, 35.019999214), (6.657495349, 35.019999461))
            ThreePointArc((6.657495349, 35.019999461), (7.488986523, 34.464415726), (7.293893252, 33.483605106))
            Line((7.293893252, 33.483605106), (4.355385482, 30.545081462))
            ThreePointArc((4.355385482, 30.545081462), (3.132038282, 29.614735241), (1.658480269, 29.177986751))
            Line((1.658480269, 29.177986751), (-1.658480269, 29.177986751))
            ThreePointArc((-1.658480269, 29.177986751), (-3.132038282, 29.614735241), (-4.355385482, 30.545081462))
            Line((-4.355385482, 30.545081462), (-7.293893252, 33.483605106))
            ThreePointArc((-7.293893252, 33.483605106), (-7.488986523, 34.464415726), (-6.657495349, 35.019999461))
            Line((-6.657495349, 35.019999461), (-4.25451262, 35.019999214))
            ThreePointArc((-4.25451262, 35.019999214), (-3.536092054, 35.317578756), (-3.238512512, 36.035999322))
            Line((-3.238512512, 36.035999322), (-3.238512512, 36.246041959))
            ThreePointArc((-3.238512512, 36.246041959), (-3.524602107, 36.952788463), (-4.22175692, 37.261516569))
            Line((-4.22175692, 37.261516569), (-10.855475092, 37.499960729))
            ThreePointArc((-10.855475092, 37.499960729), (-12.014686132, 37.056000682), (-12.499999765, 35.913485284))
            Line((-12.499999765, 35.913485284), (-12.24510272, 29.215217524))
            ThreePointArc((-12.24510272, 29.215217524), (-11.933208752, 28.520691659), (-11.226349864, 28.237858605))
            Line((-11.226349864, 28.237858605), (-11.035999792, 28.238512042))
            ThreePointArc((-11.035999792, 28.238512042), (-10.317579227, 28.536091584), (-10.019999685, 29.25451215))
            Line((-10.019999685, 29.25451215), (-10.019999931, 31.657494879))
            ThreePointArc((-10.019999931, 31.657494879), (-9.464416196, 32.488986052), (-8.483605576, 32.293892782))
            Line((-8.483605576, 32.293892782), (-5.545081932, 29.355385011))
            ThreePointArc((-5.545081932, 29.355385011), (-4.614735711, 28.132037812), (-4.177987221, 26.658479799))
            Line((-4.177987221, 26.658479799), (-4.177987221, 23.341519261))
            ThreePointArc((-4.177987221, 23.341519261), (-4.614735711, 21.867961248), (-5.545081932, 20.644614048))
            Line((-5.545081932, 20.644614048), (-8.483605576, 17.706106278))
            ThreePointArc((-8.483605576, 17.706106278), (-9.464416196, 17.511013007), (-10.019999931, 18.34250418))
            Line((-10.019999931, 18.34250418), (-10.019999685, 20.74548691))
            ThreePointArc((-10.019999685, 20.74548691), (-10.317579227, 21.463907476), (-11.035999792, 21.761487018))
            Line((-11.035999792, 21.761487018), (-11.258353132, 21.762250316))
            ThreePointArc((-11.258353132, 21.762250316), (-11.966958292, 21.477737942), (-12.277278698, 20.780049035))
            Line((-12.277278698, 20.780049035), (-12.499999765, 14.087499735))
            Line((-12.499999765, 14.087499735), (-12.499999765, 10.912499795))
            Line((-12.499999765, 10.912499795), (-12.277278698, 4.219950495))
            ThreePointArc((-12.277278698, 4.219950495), (-11.966958292, 3.522261588), (-11.258353132, 3.237749214))
            Line((-11.258353132, 3.237749214), (-11.035999792, 3.238512512))
            ThreePointArc((-11.035999792, 3.238512512), (-10.317579227, 3.536092054), (-10.019999685, 4.25451262))
            Line((-10.019999685, 4.25451262), (-10.019999931, 6.657495349))
            ThreePointArc((-10.019999931, 6.657495349), (-9.464416196, 7.488986523), (-8.483605576, 7.293893252))
        make_face()
        Circle(SKETCH1_R, mode=Mode.SUBTRACT)
        with Locations((0, 24.99999953)):
            Circle(SKETCH1_R, mode=Mode.SUBTRACT)
        with BuildLine():
            Line((-4.532162174, 5.36830524), (-7.449420439, 8.285579265))
            ThreePointArc((-7.449420439, 8.285579265), (-8.351141741, 8.889360855), (-9.418419027, 9.085760214))
            ThreePointArc((-9.418419027, 9.085760214), (-10.5176918, 9.519951543), (-10.975999794, 10.60939017))
            Line((-10.975999794, 10.60939017), (-10.975999794, 14.39060936))
            ThreePointArc((-10.975999794, 14.39060936), (-10.5176918, 15.480047987), (-9.418419027, 15.914239316))
            ThreePointArc((-9.418419027, 15.914239316), (-8.351141741, 16.110638675), (-7.449420439, 16.714420265))
            Line((-7.449420439, 16.714420265), (-4.532162174, 19.63169429))
            ThreePointArc((-4.532162174, 19.63169429), (-3.213705709, 20.512658734), (-1.658480269, 20.822012308))
            Line((-1.658480269, 20.822012308), (1.658480269, 20.822012308))
            ThreePointArc((1.658480269, 20.822012308), (3.213705709, 20.512658734), (4.532162174, 19.63169429))
            Line((4.532162174, 19.63169429), (7.449420439, 16.714420265))
            ThreePointArc((7.449420439, 16.714420265), (8.351141741, 16.110638675), (9.418419027, 15.914239316))
            ThreePointArc((9.418419027, 15.914239316), (10.5176918, 15.480047987), (10.975999794, 14.39060936))
            Line((10.975999794, 14.39060936), (10.975999794, 10.60939017))
            ThreePointArc((10.975999794, 10.60939017), (10.5176918, 9.519951543), (9.418419027, 9.085760214))
            ThreePointArc((9.418419027, 9.085760214), (8.351141741, 8.889360855), (7.449420439, 8.285579265))
            Line((7.449420439, 8.285579265), (4.532162174, 5.36830524))
            ThreePointArc((4.532162174, 5.36830524), (3.213705709, 4.487340795), (1.658480269, 4.177987221))
            Line((1.658480269, 4.177987221), (-1.658480269, 4.177987221))
            ThreePointArc((-1.658480269, 4.177987221), (-3.213705709, 4.487340795), (-4.532162174, 5.36830524))
        make_face(mode=Mode.SUBTRACT)
    extrude(amount=EXTRUDE1_DEPTH)


solid = part.part
